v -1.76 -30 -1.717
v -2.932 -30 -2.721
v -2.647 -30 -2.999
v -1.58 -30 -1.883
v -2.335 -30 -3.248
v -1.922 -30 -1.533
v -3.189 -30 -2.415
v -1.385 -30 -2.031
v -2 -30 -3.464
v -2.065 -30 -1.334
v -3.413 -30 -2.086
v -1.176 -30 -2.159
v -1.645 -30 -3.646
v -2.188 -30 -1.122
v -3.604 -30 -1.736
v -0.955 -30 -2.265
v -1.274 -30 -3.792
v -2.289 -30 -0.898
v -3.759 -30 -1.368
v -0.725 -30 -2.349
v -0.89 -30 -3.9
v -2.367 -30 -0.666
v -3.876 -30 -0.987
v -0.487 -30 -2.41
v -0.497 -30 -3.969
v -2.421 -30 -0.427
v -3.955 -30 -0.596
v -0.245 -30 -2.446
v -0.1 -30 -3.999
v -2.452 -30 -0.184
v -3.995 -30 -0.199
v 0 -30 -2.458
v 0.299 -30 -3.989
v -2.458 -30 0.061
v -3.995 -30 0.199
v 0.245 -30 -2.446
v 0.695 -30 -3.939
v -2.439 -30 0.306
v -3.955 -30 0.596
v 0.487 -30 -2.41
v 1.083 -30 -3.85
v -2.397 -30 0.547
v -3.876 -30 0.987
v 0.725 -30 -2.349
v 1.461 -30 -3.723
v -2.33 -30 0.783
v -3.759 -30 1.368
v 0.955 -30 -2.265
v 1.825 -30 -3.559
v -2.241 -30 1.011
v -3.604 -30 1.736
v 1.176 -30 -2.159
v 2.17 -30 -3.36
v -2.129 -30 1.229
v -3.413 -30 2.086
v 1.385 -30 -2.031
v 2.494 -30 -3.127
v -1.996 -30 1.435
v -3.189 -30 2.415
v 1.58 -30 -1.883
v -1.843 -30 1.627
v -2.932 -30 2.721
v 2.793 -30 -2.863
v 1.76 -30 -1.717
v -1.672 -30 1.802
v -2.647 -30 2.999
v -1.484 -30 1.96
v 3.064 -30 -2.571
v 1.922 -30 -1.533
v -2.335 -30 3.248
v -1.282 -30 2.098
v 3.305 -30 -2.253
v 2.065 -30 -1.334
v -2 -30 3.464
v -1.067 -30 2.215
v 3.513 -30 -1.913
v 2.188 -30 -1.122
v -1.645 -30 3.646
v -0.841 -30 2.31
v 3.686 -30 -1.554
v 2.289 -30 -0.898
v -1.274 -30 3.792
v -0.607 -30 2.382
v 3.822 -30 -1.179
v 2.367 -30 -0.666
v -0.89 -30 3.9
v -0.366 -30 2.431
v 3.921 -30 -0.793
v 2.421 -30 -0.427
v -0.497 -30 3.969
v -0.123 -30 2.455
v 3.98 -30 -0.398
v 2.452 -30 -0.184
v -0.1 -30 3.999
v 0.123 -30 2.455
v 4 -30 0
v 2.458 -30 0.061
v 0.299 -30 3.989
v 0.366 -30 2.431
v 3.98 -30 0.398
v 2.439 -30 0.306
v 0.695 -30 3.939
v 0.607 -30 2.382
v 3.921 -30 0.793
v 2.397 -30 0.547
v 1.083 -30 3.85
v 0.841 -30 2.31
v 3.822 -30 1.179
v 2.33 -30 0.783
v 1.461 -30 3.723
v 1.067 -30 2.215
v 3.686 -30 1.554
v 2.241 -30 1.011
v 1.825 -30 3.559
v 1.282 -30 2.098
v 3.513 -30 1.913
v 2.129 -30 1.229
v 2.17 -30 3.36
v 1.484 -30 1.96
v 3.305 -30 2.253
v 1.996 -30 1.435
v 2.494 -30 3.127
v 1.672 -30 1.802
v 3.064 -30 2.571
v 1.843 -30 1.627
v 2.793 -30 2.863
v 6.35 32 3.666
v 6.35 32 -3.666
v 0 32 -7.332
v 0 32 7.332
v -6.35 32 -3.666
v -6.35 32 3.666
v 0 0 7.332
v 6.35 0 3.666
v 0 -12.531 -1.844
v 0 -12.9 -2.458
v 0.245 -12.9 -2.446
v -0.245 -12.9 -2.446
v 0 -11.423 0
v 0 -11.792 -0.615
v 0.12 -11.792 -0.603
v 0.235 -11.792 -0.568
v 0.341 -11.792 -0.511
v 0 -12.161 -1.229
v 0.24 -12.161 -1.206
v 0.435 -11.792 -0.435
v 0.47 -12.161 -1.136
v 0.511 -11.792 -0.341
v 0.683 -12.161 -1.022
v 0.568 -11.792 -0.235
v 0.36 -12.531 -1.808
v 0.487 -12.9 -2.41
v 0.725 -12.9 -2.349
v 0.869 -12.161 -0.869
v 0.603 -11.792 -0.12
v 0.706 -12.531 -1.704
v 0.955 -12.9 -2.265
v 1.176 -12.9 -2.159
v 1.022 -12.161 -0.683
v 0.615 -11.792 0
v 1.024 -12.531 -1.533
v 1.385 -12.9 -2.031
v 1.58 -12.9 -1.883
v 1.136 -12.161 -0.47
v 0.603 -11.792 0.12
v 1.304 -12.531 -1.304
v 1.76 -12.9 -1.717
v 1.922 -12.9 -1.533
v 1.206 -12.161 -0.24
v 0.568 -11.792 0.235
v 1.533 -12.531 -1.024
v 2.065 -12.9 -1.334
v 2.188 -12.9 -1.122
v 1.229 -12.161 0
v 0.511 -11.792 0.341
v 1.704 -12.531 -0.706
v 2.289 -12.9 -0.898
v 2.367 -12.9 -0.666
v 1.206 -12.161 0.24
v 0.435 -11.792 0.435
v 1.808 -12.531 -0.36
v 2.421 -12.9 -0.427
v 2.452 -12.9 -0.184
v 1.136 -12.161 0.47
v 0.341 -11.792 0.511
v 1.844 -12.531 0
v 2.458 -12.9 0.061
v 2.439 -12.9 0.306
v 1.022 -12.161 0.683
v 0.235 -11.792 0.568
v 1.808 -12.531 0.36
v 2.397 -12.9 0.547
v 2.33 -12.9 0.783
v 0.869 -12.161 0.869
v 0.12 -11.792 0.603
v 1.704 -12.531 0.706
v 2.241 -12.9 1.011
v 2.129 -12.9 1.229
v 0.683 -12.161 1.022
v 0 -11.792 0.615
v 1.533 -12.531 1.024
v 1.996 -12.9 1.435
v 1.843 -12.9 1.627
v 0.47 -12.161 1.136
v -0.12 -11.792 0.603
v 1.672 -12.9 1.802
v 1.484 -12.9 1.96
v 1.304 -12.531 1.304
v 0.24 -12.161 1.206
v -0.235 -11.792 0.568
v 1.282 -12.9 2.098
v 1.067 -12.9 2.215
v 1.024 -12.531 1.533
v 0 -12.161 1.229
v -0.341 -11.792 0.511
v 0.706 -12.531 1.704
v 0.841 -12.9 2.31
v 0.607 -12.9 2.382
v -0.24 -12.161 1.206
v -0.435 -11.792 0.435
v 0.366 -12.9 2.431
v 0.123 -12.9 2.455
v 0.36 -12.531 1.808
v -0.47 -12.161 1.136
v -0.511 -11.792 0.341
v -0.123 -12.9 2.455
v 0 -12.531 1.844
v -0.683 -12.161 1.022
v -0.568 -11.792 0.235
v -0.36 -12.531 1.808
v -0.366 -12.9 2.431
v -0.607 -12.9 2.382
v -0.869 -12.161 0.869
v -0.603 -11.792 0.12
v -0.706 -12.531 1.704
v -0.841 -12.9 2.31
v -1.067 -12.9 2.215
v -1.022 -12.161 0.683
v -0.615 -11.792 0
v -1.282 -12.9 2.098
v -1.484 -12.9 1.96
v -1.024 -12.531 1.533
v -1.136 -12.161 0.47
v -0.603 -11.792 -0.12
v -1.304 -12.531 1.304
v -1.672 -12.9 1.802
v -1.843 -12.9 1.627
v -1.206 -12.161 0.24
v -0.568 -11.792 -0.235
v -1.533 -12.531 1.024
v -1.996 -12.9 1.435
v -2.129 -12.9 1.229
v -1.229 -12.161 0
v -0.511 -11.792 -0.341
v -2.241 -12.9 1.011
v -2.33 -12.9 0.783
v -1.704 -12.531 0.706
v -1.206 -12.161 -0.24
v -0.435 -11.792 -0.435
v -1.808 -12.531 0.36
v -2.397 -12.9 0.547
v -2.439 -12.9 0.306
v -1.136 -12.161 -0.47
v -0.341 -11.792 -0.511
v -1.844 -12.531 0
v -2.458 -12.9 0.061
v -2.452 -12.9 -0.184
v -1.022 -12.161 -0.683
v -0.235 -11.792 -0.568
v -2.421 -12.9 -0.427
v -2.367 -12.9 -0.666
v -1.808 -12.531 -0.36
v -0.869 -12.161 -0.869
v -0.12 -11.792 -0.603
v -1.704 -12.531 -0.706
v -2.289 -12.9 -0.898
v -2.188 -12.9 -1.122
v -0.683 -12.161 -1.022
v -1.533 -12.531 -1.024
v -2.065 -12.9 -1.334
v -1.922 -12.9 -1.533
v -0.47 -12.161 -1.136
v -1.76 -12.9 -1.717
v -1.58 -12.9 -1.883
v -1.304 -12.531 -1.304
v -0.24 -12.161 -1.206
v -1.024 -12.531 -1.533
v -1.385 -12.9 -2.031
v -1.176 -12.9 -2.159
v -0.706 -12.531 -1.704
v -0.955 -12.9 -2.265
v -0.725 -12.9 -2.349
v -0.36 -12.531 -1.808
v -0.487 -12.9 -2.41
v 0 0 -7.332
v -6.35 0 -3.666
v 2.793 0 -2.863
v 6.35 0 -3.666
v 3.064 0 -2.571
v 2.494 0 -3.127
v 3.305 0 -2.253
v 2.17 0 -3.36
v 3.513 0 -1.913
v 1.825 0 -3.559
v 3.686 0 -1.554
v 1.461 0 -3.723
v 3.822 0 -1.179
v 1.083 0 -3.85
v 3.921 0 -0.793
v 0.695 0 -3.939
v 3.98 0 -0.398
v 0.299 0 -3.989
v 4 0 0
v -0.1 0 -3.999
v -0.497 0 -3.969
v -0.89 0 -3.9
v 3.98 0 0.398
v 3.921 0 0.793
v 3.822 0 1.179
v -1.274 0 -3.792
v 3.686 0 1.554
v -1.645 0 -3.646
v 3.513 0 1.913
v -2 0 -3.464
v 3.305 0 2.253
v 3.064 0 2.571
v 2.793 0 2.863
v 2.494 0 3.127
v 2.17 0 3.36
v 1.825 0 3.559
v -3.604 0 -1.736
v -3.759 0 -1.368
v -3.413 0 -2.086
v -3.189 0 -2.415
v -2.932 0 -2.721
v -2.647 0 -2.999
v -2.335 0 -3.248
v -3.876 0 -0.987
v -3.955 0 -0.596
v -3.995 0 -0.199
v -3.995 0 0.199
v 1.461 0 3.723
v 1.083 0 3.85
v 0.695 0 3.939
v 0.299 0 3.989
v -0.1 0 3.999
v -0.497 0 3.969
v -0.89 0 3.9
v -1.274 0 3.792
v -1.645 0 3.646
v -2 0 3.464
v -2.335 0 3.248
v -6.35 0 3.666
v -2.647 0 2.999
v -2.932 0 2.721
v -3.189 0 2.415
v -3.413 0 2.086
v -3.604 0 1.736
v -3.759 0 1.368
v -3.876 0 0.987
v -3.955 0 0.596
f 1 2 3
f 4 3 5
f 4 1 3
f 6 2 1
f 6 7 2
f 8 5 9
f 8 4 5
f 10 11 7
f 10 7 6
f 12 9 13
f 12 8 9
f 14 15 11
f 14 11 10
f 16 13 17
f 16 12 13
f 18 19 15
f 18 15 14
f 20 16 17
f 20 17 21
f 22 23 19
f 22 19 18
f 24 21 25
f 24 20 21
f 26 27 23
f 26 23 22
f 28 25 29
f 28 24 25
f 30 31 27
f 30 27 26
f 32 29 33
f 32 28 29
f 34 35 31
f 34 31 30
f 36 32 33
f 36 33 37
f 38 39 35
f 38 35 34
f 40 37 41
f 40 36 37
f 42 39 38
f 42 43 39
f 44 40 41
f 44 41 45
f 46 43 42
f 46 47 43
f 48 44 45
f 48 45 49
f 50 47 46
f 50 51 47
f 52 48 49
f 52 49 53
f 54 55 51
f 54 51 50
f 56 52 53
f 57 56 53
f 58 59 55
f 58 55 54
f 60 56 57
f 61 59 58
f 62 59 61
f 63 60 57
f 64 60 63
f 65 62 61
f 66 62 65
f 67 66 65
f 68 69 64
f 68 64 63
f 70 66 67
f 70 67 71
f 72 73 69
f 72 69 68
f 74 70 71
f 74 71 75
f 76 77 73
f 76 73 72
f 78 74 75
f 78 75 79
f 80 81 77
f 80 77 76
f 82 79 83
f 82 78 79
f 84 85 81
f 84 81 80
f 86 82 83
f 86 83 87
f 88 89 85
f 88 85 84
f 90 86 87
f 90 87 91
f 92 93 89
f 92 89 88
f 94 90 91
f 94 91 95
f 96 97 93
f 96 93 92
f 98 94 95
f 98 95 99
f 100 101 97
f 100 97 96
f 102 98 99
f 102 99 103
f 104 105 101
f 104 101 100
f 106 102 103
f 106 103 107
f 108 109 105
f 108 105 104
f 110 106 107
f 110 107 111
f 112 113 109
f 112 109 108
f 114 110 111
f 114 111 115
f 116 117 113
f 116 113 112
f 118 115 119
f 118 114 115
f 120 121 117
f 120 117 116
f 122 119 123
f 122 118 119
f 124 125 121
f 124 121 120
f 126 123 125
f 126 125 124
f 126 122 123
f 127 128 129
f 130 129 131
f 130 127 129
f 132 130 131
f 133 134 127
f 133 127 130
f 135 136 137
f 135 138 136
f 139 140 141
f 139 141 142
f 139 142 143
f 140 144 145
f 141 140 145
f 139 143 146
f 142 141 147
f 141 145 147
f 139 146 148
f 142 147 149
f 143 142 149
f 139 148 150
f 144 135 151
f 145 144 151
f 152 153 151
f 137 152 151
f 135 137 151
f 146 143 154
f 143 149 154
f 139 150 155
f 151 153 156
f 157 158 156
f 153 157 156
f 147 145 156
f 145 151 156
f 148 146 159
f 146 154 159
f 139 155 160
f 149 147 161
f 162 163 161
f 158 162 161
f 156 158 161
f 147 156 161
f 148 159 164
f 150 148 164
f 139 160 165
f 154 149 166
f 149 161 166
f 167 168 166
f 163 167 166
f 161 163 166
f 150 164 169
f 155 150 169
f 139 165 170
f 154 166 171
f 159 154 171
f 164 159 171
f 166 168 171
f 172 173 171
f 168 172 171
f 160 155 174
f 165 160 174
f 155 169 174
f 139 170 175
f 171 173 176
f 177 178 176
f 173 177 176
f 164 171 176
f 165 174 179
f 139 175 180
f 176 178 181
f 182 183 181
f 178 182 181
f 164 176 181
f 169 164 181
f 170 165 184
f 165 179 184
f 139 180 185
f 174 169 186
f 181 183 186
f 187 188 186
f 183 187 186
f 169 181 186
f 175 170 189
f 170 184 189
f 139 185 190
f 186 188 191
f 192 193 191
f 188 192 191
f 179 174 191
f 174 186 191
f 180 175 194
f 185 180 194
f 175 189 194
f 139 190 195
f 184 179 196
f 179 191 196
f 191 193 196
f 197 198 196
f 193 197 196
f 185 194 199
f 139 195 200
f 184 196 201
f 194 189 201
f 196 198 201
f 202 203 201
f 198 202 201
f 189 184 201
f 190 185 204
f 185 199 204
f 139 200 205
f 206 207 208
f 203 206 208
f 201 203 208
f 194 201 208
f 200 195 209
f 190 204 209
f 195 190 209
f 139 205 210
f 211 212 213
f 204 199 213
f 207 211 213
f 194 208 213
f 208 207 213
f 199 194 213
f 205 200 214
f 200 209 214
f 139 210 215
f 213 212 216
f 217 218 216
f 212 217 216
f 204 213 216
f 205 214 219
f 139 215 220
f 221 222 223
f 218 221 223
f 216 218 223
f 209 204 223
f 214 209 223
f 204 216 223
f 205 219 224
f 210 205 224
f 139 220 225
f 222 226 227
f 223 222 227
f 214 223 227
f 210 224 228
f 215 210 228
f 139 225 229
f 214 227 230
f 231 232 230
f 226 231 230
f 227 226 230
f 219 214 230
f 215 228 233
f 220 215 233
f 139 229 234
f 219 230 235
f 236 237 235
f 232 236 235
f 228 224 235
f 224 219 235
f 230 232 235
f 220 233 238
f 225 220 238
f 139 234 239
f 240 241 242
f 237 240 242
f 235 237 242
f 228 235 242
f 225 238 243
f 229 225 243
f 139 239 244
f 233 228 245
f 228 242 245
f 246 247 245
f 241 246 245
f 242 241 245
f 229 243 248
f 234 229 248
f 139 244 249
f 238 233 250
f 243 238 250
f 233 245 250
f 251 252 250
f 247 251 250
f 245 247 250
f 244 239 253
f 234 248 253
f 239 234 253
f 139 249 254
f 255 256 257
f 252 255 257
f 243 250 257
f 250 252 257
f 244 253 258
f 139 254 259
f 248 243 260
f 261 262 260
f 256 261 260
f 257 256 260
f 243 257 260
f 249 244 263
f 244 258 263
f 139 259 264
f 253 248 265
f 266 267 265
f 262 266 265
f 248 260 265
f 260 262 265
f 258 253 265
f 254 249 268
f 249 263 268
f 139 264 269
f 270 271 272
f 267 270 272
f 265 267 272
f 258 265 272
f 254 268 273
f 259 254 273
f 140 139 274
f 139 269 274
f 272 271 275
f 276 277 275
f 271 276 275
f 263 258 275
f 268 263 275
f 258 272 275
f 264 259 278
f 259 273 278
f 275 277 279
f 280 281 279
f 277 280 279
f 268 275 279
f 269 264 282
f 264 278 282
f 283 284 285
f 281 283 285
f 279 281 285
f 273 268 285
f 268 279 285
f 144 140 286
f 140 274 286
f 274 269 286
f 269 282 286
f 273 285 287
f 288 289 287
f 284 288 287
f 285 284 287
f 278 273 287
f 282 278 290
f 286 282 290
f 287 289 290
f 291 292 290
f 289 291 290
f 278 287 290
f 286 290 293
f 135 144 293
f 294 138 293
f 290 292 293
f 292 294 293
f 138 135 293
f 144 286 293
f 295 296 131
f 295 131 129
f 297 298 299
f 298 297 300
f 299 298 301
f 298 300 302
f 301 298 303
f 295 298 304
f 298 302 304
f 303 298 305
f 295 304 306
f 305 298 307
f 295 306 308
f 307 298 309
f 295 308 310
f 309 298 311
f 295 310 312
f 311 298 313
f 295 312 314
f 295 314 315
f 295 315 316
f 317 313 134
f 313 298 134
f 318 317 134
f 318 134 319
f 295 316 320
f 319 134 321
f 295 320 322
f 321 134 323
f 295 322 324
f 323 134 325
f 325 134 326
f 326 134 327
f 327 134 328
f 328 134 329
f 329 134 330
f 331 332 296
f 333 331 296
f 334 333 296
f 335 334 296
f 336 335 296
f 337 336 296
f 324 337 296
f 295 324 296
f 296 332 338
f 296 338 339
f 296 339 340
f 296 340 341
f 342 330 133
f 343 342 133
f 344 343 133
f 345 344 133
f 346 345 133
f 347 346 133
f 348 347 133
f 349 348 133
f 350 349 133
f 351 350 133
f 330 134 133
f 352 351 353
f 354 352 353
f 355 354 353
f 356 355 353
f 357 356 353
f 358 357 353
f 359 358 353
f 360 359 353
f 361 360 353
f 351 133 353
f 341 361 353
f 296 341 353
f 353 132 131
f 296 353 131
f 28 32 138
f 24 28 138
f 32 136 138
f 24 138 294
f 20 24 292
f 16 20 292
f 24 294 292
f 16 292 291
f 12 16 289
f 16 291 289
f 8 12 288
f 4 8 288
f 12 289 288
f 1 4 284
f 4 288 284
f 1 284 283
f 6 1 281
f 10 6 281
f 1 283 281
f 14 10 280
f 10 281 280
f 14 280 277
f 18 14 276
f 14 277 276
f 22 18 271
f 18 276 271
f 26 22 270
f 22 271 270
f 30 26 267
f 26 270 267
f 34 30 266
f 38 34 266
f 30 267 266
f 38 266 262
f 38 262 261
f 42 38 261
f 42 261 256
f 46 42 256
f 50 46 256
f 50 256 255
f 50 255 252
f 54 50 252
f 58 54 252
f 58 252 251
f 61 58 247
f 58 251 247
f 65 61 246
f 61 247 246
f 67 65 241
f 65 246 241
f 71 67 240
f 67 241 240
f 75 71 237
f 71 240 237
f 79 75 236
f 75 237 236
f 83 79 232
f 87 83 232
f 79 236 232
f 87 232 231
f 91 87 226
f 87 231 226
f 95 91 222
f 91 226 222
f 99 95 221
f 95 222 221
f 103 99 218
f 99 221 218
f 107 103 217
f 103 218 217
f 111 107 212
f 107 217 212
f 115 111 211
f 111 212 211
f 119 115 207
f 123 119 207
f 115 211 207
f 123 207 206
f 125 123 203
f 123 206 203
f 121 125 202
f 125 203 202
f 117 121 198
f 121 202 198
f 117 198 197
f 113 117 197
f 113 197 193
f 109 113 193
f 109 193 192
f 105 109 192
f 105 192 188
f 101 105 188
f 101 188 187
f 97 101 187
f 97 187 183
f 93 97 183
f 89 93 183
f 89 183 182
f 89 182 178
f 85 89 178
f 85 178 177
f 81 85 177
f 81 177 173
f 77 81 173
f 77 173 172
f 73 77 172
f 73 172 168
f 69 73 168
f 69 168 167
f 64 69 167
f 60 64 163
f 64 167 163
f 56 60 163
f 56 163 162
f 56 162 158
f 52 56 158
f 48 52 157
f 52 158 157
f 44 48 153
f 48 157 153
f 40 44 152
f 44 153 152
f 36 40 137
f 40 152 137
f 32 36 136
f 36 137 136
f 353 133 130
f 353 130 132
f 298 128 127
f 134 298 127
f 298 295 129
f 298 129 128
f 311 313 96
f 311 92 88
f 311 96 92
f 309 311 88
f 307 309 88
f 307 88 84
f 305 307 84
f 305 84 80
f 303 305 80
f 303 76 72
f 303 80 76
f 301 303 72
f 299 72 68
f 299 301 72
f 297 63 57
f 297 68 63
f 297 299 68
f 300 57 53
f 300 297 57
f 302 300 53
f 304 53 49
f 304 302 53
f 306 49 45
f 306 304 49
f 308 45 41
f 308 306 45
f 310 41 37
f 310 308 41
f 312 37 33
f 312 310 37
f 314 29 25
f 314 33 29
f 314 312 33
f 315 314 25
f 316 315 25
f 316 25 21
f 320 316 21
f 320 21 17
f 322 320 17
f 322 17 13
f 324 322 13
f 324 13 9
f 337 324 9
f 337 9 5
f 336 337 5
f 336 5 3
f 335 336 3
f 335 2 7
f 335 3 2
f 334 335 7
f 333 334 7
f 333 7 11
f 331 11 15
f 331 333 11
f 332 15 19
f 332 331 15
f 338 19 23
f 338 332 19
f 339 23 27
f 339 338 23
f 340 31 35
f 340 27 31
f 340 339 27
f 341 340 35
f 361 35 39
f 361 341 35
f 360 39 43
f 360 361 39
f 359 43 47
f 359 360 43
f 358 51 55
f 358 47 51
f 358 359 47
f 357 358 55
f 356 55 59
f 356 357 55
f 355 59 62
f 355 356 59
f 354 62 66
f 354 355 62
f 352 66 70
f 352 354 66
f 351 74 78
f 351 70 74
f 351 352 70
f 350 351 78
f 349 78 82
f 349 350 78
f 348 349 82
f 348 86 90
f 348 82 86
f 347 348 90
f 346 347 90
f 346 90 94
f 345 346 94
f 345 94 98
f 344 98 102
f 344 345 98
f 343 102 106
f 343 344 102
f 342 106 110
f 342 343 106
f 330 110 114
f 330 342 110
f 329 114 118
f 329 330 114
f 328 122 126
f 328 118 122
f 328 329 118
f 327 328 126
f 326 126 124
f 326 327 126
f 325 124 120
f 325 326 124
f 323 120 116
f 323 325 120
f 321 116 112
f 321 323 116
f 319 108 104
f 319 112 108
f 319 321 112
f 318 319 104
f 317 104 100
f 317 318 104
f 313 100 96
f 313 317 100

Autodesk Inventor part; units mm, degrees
ref_plane "YZ Plane" through (0, 0, 0) normal (1, 0, 0) x (0, 1, 0)
ref_plane "XZ Plane" through (0, 0, 0) normal (0, 1, 0) x (-1, 0, 0)
ref_plane "XY Plane" through (0, 0, 0) normal (0, 0, 1) x (1, 0, 0)
sketch "Sketch1" plane through (0, 0, 0) normal (0, 1, 0) x (-1, 0, 0)
  line L0 (0, 7.3323) -> (6.35, 3.6662)
  line L1 (6.35, 3.6662) -> (6.35, -3.6662)
  line L2 (6.35, -3.6662) -> (0, -7.3323)
  line L3 (0, -7.3323) -> (-6.35, -3.6662)
  line L4 (-6.35, -3.6662) -> (-6.35, 3.6662)
  line L5 (-6.35, 3.6662) -> (0, 7.3323)
  point P0 (0, 0)
  point P1 (0, 0)
  dimension "d0" = 12.7
extrude "Extrusion1" add sketch "Sketch1" along normal blind 32
sketch "Sketch2" plane through (0, 0, 0) normal (0, -1, 0) x (1, 0, 0)
  circle A0 centre (0, 0) radius 4
  dimension "d3" = 8
extrude "Extrusion2" add sketch "Sketch2" along normal blind 30
sketch "Sketch3" plane through (0, -30, 0) normal (0, -1, 0) x (1, 0, 0)
  point P0 (0, 0)
hole "Hole1" at (0, -30, 0) direction (0, 1, 0) diameter 4.917 depth 17.1 tip angle 118 thread size "M6x1" class "6H" standard "ANSI Metric M Profile"
properties part number "Axle"
